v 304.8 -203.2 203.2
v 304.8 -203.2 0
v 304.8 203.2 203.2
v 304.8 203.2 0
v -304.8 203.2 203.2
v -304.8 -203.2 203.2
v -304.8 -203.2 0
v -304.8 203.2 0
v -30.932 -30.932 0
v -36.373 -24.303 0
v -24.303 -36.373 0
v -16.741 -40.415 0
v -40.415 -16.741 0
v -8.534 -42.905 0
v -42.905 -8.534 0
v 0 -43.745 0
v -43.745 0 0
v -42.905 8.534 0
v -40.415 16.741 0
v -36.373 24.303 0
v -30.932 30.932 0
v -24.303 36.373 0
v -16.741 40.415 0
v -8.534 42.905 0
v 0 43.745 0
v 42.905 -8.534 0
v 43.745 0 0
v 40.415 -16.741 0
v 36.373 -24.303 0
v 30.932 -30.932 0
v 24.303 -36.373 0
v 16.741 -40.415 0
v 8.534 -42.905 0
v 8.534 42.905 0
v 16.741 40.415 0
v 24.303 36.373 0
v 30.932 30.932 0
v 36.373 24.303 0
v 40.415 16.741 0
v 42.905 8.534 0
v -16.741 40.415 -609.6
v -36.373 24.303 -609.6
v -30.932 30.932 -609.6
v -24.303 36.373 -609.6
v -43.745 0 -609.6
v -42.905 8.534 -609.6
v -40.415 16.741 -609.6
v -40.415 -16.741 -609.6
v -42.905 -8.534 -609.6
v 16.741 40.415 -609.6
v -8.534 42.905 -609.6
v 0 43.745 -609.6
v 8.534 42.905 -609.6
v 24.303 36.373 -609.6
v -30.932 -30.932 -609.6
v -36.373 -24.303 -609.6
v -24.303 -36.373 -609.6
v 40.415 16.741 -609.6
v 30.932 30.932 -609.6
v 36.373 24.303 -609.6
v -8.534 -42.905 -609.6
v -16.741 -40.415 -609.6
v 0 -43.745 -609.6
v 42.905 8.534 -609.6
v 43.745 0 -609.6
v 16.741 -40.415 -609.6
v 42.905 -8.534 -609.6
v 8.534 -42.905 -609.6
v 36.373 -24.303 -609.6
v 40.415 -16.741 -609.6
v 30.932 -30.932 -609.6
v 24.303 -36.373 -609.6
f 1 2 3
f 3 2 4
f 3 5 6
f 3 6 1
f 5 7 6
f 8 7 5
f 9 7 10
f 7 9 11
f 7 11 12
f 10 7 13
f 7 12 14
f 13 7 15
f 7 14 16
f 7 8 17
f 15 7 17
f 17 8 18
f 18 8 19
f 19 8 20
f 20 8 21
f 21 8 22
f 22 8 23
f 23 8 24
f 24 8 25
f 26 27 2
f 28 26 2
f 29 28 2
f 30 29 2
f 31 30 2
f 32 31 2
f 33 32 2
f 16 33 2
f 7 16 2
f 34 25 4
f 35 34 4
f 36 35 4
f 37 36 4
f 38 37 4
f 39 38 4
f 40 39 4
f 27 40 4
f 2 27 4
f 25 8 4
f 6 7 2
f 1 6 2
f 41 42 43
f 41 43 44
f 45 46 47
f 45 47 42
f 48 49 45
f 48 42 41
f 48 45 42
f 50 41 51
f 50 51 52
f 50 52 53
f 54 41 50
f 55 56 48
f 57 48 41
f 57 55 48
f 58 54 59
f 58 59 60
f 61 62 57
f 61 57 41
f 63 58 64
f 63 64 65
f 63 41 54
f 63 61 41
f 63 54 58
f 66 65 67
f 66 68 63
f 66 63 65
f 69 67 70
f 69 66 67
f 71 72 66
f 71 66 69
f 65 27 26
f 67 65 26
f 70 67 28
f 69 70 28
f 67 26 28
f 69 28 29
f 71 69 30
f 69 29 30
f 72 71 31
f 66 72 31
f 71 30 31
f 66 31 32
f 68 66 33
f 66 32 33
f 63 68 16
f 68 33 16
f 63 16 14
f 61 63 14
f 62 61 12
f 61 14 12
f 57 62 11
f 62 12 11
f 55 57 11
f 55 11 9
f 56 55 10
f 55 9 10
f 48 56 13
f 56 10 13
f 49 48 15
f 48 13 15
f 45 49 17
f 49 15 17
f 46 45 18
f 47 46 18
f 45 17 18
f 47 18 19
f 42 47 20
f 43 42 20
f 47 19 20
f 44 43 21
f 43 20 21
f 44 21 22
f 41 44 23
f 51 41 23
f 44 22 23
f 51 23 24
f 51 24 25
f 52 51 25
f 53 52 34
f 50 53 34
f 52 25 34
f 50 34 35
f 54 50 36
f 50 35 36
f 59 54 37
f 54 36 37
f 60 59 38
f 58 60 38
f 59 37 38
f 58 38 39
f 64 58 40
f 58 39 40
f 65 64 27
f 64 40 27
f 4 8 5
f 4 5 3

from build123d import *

# Parameters (mm, degrees)
SKETCH_W     = 609.6
SKETCH_H     = 406.4
PAD_DEPTH    = 203.2
SKETCH001_R  = 43.745106
PAD001_DEPTH = 609.6


with BuildPart() as part:
    # Sketch → Pad (new body)
    with BuildSketch(Plane.XY):
        Rectangle(SKETCH_W, SKETCH_H)
    extrude(amount=PAD_DEPTH)

    # Sketch001 (on Face5 of Pad) → Pad001 (join)
    with BuildSketch(Plane(origin=(0, 0, 0), x_dir=(1, 0, 0), z_dir=(0, 0, -1))):
        Circle(SKETCH001_R)
    extrude(amount=PAD001_DEPTH)


solid = part.part
